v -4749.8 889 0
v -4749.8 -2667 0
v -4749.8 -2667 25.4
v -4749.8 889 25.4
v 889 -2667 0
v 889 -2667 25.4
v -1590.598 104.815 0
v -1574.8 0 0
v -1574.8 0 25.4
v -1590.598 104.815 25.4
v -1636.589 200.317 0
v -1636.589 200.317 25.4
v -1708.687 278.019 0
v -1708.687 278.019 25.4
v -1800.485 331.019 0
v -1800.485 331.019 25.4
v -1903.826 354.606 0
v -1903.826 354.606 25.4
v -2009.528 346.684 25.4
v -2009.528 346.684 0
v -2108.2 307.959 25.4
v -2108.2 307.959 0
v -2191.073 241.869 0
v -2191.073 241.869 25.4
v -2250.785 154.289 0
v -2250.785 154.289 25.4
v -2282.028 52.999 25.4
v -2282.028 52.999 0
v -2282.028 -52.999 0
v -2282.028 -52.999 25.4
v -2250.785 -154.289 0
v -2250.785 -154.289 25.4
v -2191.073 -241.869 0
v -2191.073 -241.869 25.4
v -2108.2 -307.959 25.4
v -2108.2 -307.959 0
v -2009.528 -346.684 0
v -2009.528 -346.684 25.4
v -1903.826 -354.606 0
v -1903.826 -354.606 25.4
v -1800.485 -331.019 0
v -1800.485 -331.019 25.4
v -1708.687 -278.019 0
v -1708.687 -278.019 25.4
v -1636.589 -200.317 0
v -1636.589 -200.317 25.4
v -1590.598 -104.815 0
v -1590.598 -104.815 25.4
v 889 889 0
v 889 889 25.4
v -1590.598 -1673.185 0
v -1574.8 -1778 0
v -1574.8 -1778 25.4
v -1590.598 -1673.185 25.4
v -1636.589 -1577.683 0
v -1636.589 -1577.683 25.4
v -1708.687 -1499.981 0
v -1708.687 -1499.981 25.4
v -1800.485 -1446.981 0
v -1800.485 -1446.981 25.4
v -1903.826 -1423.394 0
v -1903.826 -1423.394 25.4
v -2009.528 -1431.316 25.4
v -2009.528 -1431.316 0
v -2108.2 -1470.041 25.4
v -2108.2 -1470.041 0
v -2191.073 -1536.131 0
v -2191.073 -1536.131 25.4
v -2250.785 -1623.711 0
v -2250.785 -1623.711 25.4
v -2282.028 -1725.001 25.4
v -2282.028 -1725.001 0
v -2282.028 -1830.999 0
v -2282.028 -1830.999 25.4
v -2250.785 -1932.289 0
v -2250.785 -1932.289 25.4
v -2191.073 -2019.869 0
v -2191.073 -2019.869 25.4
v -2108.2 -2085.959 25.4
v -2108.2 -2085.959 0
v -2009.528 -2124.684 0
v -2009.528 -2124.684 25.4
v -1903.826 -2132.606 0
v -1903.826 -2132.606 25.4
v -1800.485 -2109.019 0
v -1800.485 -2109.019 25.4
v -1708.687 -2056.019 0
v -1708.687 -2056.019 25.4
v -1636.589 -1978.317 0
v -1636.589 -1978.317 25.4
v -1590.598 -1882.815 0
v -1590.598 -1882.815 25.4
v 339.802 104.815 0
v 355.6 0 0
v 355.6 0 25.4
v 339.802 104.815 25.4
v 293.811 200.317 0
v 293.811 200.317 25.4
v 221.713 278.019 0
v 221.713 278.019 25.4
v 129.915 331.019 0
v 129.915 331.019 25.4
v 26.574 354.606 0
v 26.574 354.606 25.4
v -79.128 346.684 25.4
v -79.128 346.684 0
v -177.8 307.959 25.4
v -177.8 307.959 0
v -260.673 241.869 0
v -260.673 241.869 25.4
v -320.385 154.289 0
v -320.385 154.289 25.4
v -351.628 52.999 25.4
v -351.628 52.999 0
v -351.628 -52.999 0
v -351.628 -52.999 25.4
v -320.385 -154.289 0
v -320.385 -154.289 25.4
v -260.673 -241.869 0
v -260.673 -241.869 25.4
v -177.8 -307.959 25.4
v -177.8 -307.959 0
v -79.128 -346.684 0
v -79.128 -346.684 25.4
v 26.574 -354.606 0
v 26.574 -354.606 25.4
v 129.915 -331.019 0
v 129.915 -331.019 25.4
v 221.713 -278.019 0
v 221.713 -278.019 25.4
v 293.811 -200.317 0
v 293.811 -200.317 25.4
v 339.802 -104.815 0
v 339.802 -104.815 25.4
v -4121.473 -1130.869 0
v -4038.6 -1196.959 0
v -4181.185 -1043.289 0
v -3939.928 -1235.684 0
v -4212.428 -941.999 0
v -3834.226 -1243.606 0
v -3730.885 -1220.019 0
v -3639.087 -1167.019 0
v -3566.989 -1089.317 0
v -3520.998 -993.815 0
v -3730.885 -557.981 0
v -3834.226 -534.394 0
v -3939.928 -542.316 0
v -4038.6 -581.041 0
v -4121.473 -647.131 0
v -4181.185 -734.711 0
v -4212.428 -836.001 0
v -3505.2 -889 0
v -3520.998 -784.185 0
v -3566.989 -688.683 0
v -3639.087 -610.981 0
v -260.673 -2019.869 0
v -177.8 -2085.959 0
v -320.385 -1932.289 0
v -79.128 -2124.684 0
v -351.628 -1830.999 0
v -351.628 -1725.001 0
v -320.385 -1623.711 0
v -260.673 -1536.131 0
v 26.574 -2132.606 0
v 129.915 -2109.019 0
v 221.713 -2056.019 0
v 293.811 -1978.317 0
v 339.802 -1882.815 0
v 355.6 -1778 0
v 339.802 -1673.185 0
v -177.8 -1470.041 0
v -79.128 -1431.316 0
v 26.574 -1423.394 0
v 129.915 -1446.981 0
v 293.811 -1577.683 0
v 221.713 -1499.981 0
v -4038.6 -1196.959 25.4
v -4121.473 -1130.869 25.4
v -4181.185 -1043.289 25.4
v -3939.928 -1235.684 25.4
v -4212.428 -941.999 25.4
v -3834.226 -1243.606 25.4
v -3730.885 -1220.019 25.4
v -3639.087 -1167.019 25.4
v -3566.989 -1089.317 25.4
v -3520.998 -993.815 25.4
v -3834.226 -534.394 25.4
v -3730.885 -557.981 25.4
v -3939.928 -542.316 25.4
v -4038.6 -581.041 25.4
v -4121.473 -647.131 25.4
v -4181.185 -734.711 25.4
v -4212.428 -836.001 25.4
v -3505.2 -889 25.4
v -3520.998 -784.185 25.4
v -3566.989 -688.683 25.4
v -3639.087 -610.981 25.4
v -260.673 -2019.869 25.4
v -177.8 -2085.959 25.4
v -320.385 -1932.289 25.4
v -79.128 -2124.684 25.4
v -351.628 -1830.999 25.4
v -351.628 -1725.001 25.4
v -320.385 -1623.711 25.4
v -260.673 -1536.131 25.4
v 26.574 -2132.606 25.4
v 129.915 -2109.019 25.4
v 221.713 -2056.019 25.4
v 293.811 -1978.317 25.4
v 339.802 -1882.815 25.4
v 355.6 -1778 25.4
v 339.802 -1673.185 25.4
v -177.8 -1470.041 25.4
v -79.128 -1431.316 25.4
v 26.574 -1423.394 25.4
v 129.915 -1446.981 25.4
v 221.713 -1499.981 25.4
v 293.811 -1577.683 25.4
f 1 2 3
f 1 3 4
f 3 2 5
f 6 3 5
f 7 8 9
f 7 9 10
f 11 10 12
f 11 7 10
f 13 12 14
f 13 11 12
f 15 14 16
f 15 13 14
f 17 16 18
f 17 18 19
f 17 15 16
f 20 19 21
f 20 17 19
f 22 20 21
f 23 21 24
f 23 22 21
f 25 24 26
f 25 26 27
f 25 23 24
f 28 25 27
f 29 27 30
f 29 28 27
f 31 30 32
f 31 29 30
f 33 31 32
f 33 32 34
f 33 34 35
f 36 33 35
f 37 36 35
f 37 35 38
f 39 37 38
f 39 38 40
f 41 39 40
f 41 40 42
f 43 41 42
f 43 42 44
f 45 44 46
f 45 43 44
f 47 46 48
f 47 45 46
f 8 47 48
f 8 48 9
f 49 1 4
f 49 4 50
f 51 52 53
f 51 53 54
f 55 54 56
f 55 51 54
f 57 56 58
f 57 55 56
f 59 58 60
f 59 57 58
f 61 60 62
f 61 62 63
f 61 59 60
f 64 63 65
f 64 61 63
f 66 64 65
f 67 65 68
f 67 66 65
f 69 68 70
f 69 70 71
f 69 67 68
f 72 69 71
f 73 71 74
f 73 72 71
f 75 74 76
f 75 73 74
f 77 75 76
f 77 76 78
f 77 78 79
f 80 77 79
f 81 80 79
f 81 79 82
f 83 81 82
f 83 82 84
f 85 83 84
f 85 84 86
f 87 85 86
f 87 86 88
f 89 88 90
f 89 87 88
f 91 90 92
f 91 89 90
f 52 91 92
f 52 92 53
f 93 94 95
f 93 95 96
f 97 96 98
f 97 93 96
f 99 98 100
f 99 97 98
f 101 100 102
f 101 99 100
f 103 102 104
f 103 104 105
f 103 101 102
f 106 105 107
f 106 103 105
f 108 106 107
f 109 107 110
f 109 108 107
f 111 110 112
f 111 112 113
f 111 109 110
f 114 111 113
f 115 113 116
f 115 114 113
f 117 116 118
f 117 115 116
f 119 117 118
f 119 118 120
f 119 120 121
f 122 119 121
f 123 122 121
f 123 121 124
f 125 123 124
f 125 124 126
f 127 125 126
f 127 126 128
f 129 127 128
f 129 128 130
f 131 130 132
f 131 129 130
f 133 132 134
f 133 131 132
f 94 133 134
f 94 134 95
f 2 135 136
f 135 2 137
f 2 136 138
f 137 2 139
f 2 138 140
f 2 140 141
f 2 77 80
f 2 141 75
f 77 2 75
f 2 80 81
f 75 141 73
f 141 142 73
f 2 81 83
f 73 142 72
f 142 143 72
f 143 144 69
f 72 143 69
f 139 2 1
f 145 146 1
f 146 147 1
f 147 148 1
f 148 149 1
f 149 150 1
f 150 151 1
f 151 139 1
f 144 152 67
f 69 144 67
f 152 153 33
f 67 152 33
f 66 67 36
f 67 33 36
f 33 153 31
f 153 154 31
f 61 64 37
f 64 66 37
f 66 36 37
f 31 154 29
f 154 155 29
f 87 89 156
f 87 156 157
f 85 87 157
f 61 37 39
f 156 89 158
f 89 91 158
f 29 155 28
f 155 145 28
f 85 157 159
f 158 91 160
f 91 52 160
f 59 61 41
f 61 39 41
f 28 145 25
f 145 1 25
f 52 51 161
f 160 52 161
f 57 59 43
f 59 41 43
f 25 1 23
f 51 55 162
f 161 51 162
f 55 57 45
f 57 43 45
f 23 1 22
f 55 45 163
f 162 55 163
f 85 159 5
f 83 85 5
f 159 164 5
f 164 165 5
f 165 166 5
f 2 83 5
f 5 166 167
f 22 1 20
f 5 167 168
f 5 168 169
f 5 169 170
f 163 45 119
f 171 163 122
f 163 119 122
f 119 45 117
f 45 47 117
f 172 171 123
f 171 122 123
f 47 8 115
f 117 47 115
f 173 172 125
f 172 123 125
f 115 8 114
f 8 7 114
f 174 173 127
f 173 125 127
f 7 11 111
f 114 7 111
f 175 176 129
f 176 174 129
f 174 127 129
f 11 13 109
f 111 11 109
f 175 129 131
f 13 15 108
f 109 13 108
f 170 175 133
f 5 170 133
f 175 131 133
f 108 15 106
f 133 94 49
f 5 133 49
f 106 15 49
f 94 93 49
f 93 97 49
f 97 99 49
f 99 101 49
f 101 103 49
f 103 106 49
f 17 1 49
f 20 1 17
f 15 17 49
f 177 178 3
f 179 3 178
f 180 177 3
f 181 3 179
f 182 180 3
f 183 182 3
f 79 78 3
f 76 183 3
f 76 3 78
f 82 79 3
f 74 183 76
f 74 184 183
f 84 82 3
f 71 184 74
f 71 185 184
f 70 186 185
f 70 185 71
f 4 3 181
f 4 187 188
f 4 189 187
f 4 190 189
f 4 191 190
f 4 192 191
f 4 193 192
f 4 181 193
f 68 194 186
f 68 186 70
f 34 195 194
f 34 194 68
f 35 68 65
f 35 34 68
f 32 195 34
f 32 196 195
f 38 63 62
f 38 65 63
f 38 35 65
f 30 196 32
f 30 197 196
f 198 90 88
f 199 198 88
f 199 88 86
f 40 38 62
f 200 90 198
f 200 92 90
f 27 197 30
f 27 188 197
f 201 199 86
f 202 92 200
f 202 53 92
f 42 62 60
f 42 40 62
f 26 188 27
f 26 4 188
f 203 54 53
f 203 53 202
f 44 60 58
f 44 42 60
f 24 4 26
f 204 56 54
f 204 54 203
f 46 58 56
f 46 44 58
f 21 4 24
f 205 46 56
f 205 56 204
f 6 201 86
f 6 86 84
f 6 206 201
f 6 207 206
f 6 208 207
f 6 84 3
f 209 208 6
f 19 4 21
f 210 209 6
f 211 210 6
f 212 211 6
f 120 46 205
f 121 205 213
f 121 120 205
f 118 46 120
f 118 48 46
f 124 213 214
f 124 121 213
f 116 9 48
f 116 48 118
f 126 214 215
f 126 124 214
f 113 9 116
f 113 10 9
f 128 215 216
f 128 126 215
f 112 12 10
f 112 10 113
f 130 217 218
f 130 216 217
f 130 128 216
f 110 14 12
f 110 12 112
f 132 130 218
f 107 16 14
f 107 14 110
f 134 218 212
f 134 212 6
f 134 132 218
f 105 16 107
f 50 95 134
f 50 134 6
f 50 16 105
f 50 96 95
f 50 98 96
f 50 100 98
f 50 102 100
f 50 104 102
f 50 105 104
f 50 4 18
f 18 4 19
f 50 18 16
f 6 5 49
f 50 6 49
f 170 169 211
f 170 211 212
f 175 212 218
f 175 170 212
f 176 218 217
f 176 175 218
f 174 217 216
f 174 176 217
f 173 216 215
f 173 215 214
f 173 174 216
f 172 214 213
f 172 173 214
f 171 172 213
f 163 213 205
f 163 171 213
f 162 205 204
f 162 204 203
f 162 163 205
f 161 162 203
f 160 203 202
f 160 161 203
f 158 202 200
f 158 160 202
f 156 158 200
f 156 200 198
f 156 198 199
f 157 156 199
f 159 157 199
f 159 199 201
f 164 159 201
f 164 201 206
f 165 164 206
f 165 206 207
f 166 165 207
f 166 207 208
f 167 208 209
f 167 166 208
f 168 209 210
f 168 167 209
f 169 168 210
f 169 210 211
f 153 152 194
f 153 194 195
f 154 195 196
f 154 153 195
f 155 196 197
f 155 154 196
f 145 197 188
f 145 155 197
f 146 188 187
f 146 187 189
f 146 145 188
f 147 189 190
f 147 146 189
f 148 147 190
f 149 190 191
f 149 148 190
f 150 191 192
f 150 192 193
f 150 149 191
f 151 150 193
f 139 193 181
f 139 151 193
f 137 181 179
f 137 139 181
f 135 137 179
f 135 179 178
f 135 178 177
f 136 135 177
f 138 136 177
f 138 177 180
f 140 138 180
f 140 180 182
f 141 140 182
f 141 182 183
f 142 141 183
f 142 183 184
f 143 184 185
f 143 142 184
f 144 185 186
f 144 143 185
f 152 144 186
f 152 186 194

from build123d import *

# Parameters (mm, degrees)
F0_W     = 5638.8
F0_H     = 3556
F0_R     = 355.6
F1_DEPTH = 25.4


with BuildPart() as f1:
    # F0 (on Top) → F1 (new body)
    with BuildSketch(Plane.XY):
        with Locations((-1930.4, -889)):
            Rectangle(F0_W, F0_H)
        with Locations((-1930.4, -1778)):
            Circle(F0_R, mode=Mode.SUBTRACT)
        with Locations((0, -1778)):
            Circle(F0_R, mode=Mode.SUBTRACT)
        with Locations((-3860.8, -889)):
            Circle(F0_R, mode=Mode.SUBTRACT)
        with Locations((-1930.4, 0)):
            Circle(F0_R, mode=Mode.SUBTRACT)
        Circle(F0_R, mode=Mode.SUBTRACT)
    extrude(amount=F1_DEPTH)


solid = f1.part
